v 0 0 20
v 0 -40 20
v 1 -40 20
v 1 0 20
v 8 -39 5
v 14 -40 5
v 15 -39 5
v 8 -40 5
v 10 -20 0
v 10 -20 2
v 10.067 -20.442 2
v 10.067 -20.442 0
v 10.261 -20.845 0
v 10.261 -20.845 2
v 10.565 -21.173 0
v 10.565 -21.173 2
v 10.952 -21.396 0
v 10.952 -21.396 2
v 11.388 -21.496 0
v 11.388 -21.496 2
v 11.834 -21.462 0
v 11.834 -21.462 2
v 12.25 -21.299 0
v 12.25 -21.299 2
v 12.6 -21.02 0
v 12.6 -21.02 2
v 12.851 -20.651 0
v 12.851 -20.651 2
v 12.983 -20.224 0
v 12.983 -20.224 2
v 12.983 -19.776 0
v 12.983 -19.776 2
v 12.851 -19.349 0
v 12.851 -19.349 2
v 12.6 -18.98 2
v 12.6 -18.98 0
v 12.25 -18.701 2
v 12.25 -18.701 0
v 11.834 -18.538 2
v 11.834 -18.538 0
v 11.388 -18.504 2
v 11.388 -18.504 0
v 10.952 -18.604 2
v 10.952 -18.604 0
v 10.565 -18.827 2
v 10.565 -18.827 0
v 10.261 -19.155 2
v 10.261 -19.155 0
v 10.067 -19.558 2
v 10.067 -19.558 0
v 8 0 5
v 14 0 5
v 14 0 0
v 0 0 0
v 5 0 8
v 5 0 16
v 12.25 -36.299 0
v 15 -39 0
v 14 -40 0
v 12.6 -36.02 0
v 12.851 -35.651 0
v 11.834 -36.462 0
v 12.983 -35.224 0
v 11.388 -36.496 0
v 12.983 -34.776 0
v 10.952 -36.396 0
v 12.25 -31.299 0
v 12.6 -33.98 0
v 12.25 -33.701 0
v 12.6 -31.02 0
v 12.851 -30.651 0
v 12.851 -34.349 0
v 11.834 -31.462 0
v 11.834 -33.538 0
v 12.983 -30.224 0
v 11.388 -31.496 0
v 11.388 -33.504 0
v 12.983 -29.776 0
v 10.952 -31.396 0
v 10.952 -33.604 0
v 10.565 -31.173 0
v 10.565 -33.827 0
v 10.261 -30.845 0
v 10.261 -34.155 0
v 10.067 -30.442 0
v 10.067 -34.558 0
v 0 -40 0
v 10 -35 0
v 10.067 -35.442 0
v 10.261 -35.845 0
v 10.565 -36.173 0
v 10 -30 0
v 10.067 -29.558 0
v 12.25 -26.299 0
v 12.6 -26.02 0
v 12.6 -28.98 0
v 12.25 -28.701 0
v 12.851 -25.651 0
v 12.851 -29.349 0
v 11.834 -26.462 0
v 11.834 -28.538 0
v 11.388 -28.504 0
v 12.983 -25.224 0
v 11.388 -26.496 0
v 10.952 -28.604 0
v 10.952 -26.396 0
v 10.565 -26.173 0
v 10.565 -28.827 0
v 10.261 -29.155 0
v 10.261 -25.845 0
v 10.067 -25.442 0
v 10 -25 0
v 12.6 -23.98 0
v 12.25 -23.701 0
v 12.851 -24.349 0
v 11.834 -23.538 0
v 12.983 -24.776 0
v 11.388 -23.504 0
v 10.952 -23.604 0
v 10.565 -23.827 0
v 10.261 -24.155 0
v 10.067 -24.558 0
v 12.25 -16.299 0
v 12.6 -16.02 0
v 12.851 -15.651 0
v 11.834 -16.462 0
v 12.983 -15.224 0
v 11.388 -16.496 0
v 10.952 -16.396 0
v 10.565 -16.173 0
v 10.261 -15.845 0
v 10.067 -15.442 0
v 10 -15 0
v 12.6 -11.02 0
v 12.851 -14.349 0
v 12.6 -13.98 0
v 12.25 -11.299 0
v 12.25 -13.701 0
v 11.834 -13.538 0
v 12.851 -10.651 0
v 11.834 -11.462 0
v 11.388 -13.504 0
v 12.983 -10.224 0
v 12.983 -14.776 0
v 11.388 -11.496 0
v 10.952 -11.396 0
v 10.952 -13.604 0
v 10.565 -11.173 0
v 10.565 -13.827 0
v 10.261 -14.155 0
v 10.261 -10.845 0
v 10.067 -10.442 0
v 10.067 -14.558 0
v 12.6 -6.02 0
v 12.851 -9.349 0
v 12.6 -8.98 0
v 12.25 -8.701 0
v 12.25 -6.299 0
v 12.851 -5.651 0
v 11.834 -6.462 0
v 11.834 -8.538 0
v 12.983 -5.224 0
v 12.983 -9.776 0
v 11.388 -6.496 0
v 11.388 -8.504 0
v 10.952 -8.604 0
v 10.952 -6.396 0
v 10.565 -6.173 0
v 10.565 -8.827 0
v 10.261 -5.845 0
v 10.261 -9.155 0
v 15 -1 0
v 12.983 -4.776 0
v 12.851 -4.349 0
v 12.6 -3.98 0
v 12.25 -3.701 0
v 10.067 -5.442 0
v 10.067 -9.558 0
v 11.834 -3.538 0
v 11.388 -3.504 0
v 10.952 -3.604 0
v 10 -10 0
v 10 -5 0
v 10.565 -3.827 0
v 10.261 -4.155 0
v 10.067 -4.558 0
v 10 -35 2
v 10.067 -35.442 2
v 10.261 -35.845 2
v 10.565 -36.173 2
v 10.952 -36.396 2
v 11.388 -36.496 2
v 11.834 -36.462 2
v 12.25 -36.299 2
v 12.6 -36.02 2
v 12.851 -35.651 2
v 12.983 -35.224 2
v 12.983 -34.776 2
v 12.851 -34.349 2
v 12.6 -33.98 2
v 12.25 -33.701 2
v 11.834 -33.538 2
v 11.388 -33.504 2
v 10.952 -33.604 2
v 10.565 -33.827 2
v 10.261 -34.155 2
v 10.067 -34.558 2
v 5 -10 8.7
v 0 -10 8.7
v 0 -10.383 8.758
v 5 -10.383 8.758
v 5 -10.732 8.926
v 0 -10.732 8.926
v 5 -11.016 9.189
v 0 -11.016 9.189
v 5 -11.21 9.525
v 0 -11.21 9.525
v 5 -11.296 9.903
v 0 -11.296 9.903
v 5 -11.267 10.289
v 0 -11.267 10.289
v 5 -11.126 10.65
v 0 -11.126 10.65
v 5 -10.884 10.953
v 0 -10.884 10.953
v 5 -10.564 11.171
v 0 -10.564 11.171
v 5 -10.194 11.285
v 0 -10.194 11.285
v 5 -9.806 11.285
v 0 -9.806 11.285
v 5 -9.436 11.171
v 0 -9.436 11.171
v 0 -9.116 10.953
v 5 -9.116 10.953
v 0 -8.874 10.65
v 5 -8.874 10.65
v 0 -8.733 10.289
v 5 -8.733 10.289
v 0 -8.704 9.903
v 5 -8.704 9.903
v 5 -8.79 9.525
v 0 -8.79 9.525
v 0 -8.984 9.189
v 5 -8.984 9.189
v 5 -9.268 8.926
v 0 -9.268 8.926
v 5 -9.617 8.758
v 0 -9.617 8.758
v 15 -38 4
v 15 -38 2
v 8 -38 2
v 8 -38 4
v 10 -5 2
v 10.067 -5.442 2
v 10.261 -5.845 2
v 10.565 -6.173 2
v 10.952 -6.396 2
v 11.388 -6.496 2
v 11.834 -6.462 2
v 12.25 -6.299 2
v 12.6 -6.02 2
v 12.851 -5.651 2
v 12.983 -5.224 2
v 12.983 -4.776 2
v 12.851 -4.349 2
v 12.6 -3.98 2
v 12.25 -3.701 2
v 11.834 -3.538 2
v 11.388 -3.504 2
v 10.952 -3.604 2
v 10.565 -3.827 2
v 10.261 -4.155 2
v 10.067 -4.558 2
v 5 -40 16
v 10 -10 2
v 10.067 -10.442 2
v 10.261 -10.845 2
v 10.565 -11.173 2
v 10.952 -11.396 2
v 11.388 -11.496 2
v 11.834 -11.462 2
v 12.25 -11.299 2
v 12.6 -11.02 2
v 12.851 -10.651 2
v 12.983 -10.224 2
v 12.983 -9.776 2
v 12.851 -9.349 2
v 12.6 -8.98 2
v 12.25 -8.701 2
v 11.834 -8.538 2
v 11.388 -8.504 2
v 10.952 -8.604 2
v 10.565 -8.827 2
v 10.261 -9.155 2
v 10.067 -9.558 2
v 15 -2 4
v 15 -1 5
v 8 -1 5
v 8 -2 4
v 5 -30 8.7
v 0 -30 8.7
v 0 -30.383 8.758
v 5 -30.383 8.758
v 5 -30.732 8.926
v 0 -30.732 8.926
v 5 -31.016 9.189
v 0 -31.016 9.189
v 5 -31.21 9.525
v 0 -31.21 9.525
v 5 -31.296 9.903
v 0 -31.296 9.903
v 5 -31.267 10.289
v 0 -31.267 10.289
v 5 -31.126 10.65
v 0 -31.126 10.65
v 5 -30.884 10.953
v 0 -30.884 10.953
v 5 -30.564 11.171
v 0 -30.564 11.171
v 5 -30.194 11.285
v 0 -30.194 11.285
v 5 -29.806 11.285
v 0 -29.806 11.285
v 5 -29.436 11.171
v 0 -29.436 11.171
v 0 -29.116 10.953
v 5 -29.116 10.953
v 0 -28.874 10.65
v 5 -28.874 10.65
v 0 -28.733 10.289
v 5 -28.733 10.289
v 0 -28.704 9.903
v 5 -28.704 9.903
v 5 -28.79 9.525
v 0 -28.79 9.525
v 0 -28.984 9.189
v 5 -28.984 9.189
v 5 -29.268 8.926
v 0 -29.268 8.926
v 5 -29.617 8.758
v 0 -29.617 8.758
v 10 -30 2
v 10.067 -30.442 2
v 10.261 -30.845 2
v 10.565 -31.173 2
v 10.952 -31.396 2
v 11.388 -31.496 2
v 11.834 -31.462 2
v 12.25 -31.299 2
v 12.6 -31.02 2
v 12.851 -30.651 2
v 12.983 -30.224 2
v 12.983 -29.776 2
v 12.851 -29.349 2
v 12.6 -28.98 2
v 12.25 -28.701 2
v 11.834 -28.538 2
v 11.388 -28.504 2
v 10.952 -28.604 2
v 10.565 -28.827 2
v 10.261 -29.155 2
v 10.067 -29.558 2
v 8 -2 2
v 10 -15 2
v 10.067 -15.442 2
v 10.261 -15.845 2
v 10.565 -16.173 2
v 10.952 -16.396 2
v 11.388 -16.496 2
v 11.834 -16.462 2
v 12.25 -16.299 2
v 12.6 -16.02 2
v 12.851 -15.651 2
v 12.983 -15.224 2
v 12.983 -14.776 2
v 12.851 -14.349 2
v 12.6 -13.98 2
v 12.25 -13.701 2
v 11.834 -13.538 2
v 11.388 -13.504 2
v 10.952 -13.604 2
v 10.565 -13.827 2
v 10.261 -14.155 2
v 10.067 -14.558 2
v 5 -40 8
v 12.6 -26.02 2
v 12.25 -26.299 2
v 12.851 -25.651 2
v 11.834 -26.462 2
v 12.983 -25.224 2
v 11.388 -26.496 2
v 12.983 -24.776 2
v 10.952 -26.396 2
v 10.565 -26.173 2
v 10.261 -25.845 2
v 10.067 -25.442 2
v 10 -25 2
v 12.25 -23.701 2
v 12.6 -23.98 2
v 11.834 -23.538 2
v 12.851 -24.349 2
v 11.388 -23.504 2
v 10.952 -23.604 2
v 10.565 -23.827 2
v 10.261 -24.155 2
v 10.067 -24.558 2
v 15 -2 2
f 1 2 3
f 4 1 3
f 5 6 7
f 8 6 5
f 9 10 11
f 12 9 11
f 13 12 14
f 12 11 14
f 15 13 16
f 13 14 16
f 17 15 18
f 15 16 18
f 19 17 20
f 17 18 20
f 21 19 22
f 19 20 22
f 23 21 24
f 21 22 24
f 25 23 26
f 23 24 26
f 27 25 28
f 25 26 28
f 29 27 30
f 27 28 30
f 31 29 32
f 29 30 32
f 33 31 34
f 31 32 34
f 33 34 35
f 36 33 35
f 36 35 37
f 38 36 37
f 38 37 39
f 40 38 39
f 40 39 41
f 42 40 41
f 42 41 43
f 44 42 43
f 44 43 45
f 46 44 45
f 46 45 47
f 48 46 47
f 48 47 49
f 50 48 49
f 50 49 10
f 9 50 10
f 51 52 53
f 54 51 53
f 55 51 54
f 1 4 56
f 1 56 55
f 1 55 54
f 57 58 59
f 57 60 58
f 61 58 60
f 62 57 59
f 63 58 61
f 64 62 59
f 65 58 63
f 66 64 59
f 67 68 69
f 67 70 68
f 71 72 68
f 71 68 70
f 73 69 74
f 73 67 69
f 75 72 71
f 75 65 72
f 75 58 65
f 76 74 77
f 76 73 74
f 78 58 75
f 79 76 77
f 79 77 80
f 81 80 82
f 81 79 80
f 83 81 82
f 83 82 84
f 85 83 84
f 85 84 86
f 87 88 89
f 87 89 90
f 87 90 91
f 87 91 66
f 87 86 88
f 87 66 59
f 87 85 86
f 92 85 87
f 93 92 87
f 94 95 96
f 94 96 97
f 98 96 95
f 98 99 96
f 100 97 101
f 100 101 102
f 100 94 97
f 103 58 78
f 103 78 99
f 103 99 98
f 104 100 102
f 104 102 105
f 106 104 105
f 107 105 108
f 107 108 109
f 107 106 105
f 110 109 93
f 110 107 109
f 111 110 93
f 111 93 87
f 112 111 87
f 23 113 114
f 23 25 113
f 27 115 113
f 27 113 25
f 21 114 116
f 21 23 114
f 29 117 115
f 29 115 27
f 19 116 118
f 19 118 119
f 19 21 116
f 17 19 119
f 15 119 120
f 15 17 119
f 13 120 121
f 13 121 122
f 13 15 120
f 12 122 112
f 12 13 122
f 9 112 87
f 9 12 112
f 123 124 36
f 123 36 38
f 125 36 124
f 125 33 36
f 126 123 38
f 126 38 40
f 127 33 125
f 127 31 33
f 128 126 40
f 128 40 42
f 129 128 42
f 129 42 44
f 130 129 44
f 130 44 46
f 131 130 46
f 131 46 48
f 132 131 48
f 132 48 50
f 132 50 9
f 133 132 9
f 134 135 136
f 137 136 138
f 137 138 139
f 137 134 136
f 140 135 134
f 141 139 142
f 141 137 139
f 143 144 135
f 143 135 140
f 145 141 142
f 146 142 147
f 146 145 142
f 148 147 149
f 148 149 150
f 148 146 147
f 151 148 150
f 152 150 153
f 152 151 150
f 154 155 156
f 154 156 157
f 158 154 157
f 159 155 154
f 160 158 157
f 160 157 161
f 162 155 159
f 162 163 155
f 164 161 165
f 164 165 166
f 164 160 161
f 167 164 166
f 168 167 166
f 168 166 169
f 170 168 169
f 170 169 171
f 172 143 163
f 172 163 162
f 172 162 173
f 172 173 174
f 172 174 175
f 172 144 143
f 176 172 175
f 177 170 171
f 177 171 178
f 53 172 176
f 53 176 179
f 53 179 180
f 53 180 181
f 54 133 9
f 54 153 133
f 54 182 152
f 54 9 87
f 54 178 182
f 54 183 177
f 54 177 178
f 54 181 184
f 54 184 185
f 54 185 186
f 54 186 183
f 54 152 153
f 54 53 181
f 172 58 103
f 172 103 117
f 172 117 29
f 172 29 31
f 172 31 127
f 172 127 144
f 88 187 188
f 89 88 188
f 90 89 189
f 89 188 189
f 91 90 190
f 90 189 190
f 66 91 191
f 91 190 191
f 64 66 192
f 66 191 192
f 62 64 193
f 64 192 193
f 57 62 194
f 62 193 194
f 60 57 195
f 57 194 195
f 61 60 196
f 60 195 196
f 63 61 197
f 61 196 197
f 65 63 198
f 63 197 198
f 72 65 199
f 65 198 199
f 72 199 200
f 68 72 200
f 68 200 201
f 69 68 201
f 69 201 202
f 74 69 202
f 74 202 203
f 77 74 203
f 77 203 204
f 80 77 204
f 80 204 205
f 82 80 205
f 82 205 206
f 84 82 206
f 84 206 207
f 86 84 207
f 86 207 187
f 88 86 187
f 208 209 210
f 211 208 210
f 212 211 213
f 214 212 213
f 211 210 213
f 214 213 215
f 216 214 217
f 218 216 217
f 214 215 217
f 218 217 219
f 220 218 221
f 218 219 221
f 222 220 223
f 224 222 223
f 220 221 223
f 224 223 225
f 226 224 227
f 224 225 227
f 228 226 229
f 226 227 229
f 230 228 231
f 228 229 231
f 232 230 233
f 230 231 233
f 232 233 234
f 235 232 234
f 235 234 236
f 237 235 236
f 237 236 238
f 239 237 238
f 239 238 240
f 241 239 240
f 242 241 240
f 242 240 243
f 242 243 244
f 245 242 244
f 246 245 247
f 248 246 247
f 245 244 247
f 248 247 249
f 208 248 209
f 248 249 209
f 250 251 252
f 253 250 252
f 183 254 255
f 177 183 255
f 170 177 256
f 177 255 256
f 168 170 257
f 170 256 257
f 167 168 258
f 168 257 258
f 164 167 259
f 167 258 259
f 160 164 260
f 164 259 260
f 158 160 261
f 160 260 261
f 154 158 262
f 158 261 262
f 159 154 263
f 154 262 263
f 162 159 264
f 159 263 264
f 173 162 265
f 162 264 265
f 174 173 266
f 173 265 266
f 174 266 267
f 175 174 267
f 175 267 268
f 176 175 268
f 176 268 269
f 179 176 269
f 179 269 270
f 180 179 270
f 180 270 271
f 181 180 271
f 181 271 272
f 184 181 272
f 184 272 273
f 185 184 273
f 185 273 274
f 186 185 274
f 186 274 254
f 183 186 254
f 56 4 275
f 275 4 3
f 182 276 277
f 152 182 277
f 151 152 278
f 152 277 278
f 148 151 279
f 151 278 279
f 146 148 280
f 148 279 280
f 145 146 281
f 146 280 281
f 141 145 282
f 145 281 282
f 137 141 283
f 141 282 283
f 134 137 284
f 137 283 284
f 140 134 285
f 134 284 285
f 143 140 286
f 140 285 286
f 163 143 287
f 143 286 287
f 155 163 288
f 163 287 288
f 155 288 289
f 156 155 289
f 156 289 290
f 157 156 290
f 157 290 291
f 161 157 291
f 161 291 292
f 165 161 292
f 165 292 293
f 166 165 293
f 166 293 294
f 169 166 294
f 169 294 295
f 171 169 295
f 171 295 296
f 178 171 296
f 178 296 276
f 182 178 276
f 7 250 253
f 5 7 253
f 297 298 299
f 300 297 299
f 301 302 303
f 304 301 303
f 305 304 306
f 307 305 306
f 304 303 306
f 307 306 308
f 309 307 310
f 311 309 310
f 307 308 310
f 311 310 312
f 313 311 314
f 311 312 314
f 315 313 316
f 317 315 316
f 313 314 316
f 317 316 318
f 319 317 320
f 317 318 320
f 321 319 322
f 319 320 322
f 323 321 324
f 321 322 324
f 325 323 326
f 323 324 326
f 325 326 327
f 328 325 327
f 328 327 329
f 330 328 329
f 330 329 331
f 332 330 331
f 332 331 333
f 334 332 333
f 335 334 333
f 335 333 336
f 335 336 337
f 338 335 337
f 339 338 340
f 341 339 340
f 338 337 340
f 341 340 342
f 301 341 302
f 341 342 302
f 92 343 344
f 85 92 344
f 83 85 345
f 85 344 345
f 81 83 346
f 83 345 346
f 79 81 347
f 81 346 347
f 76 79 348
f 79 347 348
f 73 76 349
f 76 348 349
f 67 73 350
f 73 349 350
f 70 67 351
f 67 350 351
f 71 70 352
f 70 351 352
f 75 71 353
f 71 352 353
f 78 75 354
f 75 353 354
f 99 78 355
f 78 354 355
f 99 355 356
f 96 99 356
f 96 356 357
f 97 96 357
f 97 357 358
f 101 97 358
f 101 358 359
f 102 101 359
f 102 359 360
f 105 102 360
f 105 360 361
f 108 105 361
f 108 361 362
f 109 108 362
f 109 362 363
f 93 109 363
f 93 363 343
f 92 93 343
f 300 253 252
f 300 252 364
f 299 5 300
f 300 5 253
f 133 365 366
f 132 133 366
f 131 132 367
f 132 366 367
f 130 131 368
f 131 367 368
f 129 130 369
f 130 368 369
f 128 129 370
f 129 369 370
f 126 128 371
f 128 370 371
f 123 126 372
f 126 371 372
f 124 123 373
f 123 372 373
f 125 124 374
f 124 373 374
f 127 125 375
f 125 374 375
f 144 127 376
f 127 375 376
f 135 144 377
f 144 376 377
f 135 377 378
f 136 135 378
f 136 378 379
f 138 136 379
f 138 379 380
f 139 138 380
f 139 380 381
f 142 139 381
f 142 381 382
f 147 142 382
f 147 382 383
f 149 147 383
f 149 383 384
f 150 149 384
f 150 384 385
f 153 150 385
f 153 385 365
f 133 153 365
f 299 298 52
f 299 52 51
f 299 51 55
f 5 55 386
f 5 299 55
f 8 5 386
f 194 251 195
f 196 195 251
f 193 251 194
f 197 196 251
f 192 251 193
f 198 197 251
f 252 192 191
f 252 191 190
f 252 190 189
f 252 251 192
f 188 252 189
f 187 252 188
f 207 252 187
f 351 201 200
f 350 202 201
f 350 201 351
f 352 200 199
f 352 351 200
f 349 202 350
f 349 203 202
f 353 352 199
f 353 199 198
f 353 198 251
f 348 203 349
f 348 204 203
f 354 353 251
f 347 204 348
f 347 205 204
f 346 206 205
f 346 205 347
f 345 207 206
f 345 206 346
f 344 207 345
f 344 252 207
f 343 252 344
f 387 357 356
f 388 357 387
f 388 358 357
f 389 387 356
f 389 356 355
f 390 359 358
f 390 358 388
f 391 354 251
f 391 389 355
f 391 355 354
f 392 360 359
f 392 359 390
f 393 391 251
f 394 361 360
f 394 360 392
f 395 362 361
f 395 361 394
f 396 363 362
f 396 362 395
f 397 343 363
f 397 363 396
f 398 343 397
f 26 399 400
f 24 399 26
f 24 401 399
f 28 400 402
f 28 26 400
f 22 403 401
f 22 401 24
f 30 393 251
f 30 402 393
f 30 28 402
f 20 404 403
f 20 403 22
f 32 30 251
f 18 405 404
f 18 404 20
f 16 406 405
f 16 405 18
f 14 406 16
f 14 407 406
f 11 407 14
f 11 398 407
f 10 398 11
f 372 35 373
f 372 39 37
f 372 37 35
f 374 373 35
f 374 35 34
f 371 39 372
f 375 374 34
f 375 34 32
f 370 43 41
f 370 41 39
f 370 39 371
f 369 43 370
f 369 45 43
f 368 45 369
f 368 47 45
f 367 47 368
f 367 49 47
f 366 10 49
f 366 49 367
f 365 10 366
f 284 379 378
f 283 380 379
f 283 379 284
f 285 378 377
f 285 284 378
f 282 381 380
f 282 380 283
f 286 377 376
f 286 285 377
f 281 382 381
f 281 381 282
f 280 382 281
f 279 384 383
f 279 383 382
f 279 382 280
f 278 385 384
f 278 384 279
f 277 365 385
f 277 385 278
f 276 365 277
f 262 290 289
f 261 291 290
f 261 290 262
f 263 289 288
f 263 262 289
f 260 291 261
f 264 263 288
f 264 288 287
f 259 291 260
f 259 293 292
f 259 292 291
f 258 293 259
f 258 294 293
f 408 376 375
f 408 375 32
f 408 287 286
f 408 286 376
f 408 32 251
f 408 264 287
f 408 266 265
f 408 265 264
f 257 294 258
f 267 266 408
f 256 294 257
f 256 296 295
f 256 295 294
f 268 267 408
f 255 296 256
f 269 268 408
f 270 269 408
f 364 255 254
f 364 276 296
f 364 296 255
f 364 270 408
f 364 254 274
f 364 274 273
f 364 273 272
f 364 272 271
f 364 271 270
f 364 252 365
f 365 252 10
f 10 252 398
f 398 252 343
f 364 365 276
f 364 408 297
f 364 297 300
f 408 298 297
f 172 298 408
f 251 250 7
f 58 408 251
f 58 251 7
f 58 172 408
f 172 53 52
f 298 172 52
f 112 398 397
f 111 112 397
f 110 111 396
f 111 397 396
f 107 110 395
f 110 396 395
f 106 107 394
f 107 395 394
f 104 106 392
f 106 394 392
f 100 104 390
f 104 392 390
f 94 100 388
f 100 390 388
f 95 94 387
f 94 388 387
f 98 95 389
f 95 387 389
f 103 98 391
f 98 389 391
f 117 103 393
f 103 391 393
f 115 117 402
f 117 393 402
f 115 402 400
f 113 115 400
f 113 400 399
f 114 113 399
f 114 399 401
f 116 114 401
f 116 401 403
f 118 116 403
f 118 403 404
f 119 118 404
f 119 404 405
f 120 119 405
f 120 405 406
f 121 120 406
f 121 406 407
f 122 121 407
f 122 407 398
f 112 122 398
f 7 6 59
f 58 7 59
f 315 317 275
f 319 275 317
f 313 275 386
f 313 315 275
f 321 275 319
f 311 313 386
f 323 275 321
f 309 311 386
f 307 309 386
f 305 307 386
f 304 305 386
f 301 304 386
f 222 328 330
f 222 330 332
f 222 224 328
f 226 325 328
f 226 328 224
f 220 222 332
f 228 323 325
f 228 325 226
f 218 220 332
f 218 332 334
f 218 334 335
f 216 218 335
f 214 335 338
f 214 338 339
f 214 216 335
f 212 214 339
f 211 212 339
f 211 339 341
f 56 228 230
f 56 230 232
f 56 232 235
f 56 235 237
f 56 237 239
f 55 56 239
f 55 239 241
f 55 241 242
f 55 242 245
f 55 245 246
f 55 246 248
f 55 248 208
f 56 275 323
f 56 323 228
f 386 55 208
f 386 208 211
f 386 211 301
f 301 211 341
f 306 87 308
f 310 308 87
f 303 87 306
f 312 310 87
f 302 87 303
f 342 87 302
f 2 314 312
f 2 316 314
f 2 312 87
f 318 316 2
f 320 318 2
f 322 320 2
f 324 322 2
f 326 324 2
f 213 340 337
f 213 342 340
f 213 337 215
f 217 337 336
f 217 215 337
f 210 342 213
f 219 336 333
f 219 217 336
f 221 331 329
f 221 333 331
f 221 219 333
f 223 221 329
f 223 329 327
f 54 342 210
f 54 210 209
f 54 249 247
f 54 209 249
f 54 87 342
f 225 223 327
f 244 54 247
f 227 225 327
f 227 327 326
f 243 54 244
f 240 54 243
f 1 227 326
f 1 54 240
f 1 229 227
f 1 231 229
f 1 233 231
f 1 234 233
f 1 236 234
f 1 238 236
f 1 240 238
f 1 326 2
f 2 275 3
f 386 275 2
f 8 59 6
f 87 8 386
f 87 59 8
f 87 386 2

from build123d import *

# Parameters (mm, degrees)
PAD_DEPTH         = 40
SKETCH001_R       = 1.3
POCKET_DEPTH      = 5
CHAMFER_SIZE      = 3
CHAMFER001_SIZE   = 4
SKETCH002_R       = 1.5
POCKET001_DEPTH   = 5.001
POCKET001_FACE6_W = 40
POCKET001_FACE6_H = 7
POCKET001_FACE6_R = 1.5
POCKET008_DEPTH   = 3
SKETCH013_W       = 7
SKETCH013_H       = 2
PAD006_DEPTH      = 3
CHAMFER010_SIZE   = 1
CHAMFER011_SIZE   = 1


with BuildPart() as part:
    # Sketch → Pad (new body)
    with BuildSketch(Plane.XZ):
        Polygon((0, 0), (0, 20), (5, 20), (5, 5), (15, 5), (15, 0), align=None)
    extrude(amount=PAD_DEPTH)

    # Sketch001 (on Face1 of Pad) → Pocket (cut)
    with BuildSketch(Plane(origin=(0, 0, 0), x_dir=(0, 0, -1), z_dir=(-1, 0, 0))):
        with Locations((-10, 30)):
            Circle(SKETCH001_R)
        with Locations((-10, 10)):
            Circle(SKETCH001_R)
    extrude(amount=-POCKET_DEPTH, mode=Mode.SUBTRACT)

    # Chamfer
    chamfer_edges = [part.edges().sort_by_distance(p)[0] for p in [
        (5, -20, 5),
    ]]
    chamfer(chamfer_edges, length=CHAMFER_SIZE)

    # Chamfer001
    chamfer001_edges = [part.edges().sort_by_distance(p)[0] for p in [
        (5, -20, 20),
    ]]
    chamfer(chamfer001_edges, length=CHAMFER001_SIZE)

    # Sketch002 (on Face6 of Chamfer001) → Pocket001 (cut, through all)
    with BuildSketch(Plane(origin=(0, 0, 5), x_dir=(-1, 0, 0), z_dir=(0, 0, 1))):
        with Locations((-11.5, 35)):
            Circle(SKETCH002_R)
        with Locations((-11.5, 30)):
            Circle(SKETCH002_R)
        with Locations((-11.5, 25)):
            Circle(SKETCH002_R)
        with Locations((-11.5, 20)):
            Circle(SKETCH002_R)
        with Locations((-11.5, 15)):
            Circle(SKETCH002_R)
        with Locations((-11.5, 10)):
            Circle(SKETCH002_R)
        with Locations((-11.5, 5)):
            Circle(SKETCH002_R)
    extrude(amount=-POCKET001_DEPTH, mode=Mode.SUBTRACT)

    # Pocket001 Face6 → Pocket008 (cut)
    with BuildSketch(Plane(origin=(11.5, -20, 5), x_dir=(0, 1, 0), z_dir=(0, 0, 1))):
        Rectangle(POCKET001_FACE6_W, POCKET001_FACE6_H)
        with Locations((-15, 0)):
            Circle(POCKET001_FACE6_R, mode=Mode.SUBTRACT)
        with Locations((-10, 0)):
            Circle(POCKET001_FACE6_R, mode=Mode.SUBTRACT)
        with Locations((-5, 0)):
            Circle(POCKET001_FACE6_R, mode=Mode.SUBTRACT)
        Circle(POCKET001_FACE6_R, mode=Mode.SUBTRACT)
        with Locations((5, 0)):
            Circle(POCKET001_FACE6_R, mode=Mode.SUBTRACT)
        with Locations((10, 0)):
            Circle(POCKET001_FACE6_R, mode=Mode.SUBTRACT)
        with Locations((15, 0)):
            Circle(POCKET001_FACE6_R, mode=Mode.SUBTRACT)
    extrude(amount=-POCKET008_DEPTH, mode=Mode.SUBTRACT)

    # Sketch013 (on Face7 of Pocket008) → Pad006 (join)
    with BuildSketch(Plane(origin=(0, 0, 2), x_dir=(-1, 0, 0), z_dir=(0, 0, 1))):
        with Locations((-11.5, 39)):
            Rectangle(SKETCH013_W, SKETCH013_H)
        with Locations((-11.5, 1)):
            Rectangle(SKETCH013_W, SKETCH013_H)
    extrude(amount=PAD006_DEPTH)

    # Chamfer010
    chamfer010_edges = [part.edges().sort_by_distance(p)[0] for p in [
        (15, -40, 2.5),
        (15, 0, 2.5),
    ]]
    chamfer(chamfer010_edges, length=CHAMFER010_SIZE)

    # Chamfer011
    chamfer011_edges = [part.edges().sort_by_distance(p)[0] for p in [
        (11.5, -2, 5),
        (11.5, -38, 5),
    ]]
    chamfer(chamfer011_edges, length=CHAMFER011_SIZE)


solid = part.part
